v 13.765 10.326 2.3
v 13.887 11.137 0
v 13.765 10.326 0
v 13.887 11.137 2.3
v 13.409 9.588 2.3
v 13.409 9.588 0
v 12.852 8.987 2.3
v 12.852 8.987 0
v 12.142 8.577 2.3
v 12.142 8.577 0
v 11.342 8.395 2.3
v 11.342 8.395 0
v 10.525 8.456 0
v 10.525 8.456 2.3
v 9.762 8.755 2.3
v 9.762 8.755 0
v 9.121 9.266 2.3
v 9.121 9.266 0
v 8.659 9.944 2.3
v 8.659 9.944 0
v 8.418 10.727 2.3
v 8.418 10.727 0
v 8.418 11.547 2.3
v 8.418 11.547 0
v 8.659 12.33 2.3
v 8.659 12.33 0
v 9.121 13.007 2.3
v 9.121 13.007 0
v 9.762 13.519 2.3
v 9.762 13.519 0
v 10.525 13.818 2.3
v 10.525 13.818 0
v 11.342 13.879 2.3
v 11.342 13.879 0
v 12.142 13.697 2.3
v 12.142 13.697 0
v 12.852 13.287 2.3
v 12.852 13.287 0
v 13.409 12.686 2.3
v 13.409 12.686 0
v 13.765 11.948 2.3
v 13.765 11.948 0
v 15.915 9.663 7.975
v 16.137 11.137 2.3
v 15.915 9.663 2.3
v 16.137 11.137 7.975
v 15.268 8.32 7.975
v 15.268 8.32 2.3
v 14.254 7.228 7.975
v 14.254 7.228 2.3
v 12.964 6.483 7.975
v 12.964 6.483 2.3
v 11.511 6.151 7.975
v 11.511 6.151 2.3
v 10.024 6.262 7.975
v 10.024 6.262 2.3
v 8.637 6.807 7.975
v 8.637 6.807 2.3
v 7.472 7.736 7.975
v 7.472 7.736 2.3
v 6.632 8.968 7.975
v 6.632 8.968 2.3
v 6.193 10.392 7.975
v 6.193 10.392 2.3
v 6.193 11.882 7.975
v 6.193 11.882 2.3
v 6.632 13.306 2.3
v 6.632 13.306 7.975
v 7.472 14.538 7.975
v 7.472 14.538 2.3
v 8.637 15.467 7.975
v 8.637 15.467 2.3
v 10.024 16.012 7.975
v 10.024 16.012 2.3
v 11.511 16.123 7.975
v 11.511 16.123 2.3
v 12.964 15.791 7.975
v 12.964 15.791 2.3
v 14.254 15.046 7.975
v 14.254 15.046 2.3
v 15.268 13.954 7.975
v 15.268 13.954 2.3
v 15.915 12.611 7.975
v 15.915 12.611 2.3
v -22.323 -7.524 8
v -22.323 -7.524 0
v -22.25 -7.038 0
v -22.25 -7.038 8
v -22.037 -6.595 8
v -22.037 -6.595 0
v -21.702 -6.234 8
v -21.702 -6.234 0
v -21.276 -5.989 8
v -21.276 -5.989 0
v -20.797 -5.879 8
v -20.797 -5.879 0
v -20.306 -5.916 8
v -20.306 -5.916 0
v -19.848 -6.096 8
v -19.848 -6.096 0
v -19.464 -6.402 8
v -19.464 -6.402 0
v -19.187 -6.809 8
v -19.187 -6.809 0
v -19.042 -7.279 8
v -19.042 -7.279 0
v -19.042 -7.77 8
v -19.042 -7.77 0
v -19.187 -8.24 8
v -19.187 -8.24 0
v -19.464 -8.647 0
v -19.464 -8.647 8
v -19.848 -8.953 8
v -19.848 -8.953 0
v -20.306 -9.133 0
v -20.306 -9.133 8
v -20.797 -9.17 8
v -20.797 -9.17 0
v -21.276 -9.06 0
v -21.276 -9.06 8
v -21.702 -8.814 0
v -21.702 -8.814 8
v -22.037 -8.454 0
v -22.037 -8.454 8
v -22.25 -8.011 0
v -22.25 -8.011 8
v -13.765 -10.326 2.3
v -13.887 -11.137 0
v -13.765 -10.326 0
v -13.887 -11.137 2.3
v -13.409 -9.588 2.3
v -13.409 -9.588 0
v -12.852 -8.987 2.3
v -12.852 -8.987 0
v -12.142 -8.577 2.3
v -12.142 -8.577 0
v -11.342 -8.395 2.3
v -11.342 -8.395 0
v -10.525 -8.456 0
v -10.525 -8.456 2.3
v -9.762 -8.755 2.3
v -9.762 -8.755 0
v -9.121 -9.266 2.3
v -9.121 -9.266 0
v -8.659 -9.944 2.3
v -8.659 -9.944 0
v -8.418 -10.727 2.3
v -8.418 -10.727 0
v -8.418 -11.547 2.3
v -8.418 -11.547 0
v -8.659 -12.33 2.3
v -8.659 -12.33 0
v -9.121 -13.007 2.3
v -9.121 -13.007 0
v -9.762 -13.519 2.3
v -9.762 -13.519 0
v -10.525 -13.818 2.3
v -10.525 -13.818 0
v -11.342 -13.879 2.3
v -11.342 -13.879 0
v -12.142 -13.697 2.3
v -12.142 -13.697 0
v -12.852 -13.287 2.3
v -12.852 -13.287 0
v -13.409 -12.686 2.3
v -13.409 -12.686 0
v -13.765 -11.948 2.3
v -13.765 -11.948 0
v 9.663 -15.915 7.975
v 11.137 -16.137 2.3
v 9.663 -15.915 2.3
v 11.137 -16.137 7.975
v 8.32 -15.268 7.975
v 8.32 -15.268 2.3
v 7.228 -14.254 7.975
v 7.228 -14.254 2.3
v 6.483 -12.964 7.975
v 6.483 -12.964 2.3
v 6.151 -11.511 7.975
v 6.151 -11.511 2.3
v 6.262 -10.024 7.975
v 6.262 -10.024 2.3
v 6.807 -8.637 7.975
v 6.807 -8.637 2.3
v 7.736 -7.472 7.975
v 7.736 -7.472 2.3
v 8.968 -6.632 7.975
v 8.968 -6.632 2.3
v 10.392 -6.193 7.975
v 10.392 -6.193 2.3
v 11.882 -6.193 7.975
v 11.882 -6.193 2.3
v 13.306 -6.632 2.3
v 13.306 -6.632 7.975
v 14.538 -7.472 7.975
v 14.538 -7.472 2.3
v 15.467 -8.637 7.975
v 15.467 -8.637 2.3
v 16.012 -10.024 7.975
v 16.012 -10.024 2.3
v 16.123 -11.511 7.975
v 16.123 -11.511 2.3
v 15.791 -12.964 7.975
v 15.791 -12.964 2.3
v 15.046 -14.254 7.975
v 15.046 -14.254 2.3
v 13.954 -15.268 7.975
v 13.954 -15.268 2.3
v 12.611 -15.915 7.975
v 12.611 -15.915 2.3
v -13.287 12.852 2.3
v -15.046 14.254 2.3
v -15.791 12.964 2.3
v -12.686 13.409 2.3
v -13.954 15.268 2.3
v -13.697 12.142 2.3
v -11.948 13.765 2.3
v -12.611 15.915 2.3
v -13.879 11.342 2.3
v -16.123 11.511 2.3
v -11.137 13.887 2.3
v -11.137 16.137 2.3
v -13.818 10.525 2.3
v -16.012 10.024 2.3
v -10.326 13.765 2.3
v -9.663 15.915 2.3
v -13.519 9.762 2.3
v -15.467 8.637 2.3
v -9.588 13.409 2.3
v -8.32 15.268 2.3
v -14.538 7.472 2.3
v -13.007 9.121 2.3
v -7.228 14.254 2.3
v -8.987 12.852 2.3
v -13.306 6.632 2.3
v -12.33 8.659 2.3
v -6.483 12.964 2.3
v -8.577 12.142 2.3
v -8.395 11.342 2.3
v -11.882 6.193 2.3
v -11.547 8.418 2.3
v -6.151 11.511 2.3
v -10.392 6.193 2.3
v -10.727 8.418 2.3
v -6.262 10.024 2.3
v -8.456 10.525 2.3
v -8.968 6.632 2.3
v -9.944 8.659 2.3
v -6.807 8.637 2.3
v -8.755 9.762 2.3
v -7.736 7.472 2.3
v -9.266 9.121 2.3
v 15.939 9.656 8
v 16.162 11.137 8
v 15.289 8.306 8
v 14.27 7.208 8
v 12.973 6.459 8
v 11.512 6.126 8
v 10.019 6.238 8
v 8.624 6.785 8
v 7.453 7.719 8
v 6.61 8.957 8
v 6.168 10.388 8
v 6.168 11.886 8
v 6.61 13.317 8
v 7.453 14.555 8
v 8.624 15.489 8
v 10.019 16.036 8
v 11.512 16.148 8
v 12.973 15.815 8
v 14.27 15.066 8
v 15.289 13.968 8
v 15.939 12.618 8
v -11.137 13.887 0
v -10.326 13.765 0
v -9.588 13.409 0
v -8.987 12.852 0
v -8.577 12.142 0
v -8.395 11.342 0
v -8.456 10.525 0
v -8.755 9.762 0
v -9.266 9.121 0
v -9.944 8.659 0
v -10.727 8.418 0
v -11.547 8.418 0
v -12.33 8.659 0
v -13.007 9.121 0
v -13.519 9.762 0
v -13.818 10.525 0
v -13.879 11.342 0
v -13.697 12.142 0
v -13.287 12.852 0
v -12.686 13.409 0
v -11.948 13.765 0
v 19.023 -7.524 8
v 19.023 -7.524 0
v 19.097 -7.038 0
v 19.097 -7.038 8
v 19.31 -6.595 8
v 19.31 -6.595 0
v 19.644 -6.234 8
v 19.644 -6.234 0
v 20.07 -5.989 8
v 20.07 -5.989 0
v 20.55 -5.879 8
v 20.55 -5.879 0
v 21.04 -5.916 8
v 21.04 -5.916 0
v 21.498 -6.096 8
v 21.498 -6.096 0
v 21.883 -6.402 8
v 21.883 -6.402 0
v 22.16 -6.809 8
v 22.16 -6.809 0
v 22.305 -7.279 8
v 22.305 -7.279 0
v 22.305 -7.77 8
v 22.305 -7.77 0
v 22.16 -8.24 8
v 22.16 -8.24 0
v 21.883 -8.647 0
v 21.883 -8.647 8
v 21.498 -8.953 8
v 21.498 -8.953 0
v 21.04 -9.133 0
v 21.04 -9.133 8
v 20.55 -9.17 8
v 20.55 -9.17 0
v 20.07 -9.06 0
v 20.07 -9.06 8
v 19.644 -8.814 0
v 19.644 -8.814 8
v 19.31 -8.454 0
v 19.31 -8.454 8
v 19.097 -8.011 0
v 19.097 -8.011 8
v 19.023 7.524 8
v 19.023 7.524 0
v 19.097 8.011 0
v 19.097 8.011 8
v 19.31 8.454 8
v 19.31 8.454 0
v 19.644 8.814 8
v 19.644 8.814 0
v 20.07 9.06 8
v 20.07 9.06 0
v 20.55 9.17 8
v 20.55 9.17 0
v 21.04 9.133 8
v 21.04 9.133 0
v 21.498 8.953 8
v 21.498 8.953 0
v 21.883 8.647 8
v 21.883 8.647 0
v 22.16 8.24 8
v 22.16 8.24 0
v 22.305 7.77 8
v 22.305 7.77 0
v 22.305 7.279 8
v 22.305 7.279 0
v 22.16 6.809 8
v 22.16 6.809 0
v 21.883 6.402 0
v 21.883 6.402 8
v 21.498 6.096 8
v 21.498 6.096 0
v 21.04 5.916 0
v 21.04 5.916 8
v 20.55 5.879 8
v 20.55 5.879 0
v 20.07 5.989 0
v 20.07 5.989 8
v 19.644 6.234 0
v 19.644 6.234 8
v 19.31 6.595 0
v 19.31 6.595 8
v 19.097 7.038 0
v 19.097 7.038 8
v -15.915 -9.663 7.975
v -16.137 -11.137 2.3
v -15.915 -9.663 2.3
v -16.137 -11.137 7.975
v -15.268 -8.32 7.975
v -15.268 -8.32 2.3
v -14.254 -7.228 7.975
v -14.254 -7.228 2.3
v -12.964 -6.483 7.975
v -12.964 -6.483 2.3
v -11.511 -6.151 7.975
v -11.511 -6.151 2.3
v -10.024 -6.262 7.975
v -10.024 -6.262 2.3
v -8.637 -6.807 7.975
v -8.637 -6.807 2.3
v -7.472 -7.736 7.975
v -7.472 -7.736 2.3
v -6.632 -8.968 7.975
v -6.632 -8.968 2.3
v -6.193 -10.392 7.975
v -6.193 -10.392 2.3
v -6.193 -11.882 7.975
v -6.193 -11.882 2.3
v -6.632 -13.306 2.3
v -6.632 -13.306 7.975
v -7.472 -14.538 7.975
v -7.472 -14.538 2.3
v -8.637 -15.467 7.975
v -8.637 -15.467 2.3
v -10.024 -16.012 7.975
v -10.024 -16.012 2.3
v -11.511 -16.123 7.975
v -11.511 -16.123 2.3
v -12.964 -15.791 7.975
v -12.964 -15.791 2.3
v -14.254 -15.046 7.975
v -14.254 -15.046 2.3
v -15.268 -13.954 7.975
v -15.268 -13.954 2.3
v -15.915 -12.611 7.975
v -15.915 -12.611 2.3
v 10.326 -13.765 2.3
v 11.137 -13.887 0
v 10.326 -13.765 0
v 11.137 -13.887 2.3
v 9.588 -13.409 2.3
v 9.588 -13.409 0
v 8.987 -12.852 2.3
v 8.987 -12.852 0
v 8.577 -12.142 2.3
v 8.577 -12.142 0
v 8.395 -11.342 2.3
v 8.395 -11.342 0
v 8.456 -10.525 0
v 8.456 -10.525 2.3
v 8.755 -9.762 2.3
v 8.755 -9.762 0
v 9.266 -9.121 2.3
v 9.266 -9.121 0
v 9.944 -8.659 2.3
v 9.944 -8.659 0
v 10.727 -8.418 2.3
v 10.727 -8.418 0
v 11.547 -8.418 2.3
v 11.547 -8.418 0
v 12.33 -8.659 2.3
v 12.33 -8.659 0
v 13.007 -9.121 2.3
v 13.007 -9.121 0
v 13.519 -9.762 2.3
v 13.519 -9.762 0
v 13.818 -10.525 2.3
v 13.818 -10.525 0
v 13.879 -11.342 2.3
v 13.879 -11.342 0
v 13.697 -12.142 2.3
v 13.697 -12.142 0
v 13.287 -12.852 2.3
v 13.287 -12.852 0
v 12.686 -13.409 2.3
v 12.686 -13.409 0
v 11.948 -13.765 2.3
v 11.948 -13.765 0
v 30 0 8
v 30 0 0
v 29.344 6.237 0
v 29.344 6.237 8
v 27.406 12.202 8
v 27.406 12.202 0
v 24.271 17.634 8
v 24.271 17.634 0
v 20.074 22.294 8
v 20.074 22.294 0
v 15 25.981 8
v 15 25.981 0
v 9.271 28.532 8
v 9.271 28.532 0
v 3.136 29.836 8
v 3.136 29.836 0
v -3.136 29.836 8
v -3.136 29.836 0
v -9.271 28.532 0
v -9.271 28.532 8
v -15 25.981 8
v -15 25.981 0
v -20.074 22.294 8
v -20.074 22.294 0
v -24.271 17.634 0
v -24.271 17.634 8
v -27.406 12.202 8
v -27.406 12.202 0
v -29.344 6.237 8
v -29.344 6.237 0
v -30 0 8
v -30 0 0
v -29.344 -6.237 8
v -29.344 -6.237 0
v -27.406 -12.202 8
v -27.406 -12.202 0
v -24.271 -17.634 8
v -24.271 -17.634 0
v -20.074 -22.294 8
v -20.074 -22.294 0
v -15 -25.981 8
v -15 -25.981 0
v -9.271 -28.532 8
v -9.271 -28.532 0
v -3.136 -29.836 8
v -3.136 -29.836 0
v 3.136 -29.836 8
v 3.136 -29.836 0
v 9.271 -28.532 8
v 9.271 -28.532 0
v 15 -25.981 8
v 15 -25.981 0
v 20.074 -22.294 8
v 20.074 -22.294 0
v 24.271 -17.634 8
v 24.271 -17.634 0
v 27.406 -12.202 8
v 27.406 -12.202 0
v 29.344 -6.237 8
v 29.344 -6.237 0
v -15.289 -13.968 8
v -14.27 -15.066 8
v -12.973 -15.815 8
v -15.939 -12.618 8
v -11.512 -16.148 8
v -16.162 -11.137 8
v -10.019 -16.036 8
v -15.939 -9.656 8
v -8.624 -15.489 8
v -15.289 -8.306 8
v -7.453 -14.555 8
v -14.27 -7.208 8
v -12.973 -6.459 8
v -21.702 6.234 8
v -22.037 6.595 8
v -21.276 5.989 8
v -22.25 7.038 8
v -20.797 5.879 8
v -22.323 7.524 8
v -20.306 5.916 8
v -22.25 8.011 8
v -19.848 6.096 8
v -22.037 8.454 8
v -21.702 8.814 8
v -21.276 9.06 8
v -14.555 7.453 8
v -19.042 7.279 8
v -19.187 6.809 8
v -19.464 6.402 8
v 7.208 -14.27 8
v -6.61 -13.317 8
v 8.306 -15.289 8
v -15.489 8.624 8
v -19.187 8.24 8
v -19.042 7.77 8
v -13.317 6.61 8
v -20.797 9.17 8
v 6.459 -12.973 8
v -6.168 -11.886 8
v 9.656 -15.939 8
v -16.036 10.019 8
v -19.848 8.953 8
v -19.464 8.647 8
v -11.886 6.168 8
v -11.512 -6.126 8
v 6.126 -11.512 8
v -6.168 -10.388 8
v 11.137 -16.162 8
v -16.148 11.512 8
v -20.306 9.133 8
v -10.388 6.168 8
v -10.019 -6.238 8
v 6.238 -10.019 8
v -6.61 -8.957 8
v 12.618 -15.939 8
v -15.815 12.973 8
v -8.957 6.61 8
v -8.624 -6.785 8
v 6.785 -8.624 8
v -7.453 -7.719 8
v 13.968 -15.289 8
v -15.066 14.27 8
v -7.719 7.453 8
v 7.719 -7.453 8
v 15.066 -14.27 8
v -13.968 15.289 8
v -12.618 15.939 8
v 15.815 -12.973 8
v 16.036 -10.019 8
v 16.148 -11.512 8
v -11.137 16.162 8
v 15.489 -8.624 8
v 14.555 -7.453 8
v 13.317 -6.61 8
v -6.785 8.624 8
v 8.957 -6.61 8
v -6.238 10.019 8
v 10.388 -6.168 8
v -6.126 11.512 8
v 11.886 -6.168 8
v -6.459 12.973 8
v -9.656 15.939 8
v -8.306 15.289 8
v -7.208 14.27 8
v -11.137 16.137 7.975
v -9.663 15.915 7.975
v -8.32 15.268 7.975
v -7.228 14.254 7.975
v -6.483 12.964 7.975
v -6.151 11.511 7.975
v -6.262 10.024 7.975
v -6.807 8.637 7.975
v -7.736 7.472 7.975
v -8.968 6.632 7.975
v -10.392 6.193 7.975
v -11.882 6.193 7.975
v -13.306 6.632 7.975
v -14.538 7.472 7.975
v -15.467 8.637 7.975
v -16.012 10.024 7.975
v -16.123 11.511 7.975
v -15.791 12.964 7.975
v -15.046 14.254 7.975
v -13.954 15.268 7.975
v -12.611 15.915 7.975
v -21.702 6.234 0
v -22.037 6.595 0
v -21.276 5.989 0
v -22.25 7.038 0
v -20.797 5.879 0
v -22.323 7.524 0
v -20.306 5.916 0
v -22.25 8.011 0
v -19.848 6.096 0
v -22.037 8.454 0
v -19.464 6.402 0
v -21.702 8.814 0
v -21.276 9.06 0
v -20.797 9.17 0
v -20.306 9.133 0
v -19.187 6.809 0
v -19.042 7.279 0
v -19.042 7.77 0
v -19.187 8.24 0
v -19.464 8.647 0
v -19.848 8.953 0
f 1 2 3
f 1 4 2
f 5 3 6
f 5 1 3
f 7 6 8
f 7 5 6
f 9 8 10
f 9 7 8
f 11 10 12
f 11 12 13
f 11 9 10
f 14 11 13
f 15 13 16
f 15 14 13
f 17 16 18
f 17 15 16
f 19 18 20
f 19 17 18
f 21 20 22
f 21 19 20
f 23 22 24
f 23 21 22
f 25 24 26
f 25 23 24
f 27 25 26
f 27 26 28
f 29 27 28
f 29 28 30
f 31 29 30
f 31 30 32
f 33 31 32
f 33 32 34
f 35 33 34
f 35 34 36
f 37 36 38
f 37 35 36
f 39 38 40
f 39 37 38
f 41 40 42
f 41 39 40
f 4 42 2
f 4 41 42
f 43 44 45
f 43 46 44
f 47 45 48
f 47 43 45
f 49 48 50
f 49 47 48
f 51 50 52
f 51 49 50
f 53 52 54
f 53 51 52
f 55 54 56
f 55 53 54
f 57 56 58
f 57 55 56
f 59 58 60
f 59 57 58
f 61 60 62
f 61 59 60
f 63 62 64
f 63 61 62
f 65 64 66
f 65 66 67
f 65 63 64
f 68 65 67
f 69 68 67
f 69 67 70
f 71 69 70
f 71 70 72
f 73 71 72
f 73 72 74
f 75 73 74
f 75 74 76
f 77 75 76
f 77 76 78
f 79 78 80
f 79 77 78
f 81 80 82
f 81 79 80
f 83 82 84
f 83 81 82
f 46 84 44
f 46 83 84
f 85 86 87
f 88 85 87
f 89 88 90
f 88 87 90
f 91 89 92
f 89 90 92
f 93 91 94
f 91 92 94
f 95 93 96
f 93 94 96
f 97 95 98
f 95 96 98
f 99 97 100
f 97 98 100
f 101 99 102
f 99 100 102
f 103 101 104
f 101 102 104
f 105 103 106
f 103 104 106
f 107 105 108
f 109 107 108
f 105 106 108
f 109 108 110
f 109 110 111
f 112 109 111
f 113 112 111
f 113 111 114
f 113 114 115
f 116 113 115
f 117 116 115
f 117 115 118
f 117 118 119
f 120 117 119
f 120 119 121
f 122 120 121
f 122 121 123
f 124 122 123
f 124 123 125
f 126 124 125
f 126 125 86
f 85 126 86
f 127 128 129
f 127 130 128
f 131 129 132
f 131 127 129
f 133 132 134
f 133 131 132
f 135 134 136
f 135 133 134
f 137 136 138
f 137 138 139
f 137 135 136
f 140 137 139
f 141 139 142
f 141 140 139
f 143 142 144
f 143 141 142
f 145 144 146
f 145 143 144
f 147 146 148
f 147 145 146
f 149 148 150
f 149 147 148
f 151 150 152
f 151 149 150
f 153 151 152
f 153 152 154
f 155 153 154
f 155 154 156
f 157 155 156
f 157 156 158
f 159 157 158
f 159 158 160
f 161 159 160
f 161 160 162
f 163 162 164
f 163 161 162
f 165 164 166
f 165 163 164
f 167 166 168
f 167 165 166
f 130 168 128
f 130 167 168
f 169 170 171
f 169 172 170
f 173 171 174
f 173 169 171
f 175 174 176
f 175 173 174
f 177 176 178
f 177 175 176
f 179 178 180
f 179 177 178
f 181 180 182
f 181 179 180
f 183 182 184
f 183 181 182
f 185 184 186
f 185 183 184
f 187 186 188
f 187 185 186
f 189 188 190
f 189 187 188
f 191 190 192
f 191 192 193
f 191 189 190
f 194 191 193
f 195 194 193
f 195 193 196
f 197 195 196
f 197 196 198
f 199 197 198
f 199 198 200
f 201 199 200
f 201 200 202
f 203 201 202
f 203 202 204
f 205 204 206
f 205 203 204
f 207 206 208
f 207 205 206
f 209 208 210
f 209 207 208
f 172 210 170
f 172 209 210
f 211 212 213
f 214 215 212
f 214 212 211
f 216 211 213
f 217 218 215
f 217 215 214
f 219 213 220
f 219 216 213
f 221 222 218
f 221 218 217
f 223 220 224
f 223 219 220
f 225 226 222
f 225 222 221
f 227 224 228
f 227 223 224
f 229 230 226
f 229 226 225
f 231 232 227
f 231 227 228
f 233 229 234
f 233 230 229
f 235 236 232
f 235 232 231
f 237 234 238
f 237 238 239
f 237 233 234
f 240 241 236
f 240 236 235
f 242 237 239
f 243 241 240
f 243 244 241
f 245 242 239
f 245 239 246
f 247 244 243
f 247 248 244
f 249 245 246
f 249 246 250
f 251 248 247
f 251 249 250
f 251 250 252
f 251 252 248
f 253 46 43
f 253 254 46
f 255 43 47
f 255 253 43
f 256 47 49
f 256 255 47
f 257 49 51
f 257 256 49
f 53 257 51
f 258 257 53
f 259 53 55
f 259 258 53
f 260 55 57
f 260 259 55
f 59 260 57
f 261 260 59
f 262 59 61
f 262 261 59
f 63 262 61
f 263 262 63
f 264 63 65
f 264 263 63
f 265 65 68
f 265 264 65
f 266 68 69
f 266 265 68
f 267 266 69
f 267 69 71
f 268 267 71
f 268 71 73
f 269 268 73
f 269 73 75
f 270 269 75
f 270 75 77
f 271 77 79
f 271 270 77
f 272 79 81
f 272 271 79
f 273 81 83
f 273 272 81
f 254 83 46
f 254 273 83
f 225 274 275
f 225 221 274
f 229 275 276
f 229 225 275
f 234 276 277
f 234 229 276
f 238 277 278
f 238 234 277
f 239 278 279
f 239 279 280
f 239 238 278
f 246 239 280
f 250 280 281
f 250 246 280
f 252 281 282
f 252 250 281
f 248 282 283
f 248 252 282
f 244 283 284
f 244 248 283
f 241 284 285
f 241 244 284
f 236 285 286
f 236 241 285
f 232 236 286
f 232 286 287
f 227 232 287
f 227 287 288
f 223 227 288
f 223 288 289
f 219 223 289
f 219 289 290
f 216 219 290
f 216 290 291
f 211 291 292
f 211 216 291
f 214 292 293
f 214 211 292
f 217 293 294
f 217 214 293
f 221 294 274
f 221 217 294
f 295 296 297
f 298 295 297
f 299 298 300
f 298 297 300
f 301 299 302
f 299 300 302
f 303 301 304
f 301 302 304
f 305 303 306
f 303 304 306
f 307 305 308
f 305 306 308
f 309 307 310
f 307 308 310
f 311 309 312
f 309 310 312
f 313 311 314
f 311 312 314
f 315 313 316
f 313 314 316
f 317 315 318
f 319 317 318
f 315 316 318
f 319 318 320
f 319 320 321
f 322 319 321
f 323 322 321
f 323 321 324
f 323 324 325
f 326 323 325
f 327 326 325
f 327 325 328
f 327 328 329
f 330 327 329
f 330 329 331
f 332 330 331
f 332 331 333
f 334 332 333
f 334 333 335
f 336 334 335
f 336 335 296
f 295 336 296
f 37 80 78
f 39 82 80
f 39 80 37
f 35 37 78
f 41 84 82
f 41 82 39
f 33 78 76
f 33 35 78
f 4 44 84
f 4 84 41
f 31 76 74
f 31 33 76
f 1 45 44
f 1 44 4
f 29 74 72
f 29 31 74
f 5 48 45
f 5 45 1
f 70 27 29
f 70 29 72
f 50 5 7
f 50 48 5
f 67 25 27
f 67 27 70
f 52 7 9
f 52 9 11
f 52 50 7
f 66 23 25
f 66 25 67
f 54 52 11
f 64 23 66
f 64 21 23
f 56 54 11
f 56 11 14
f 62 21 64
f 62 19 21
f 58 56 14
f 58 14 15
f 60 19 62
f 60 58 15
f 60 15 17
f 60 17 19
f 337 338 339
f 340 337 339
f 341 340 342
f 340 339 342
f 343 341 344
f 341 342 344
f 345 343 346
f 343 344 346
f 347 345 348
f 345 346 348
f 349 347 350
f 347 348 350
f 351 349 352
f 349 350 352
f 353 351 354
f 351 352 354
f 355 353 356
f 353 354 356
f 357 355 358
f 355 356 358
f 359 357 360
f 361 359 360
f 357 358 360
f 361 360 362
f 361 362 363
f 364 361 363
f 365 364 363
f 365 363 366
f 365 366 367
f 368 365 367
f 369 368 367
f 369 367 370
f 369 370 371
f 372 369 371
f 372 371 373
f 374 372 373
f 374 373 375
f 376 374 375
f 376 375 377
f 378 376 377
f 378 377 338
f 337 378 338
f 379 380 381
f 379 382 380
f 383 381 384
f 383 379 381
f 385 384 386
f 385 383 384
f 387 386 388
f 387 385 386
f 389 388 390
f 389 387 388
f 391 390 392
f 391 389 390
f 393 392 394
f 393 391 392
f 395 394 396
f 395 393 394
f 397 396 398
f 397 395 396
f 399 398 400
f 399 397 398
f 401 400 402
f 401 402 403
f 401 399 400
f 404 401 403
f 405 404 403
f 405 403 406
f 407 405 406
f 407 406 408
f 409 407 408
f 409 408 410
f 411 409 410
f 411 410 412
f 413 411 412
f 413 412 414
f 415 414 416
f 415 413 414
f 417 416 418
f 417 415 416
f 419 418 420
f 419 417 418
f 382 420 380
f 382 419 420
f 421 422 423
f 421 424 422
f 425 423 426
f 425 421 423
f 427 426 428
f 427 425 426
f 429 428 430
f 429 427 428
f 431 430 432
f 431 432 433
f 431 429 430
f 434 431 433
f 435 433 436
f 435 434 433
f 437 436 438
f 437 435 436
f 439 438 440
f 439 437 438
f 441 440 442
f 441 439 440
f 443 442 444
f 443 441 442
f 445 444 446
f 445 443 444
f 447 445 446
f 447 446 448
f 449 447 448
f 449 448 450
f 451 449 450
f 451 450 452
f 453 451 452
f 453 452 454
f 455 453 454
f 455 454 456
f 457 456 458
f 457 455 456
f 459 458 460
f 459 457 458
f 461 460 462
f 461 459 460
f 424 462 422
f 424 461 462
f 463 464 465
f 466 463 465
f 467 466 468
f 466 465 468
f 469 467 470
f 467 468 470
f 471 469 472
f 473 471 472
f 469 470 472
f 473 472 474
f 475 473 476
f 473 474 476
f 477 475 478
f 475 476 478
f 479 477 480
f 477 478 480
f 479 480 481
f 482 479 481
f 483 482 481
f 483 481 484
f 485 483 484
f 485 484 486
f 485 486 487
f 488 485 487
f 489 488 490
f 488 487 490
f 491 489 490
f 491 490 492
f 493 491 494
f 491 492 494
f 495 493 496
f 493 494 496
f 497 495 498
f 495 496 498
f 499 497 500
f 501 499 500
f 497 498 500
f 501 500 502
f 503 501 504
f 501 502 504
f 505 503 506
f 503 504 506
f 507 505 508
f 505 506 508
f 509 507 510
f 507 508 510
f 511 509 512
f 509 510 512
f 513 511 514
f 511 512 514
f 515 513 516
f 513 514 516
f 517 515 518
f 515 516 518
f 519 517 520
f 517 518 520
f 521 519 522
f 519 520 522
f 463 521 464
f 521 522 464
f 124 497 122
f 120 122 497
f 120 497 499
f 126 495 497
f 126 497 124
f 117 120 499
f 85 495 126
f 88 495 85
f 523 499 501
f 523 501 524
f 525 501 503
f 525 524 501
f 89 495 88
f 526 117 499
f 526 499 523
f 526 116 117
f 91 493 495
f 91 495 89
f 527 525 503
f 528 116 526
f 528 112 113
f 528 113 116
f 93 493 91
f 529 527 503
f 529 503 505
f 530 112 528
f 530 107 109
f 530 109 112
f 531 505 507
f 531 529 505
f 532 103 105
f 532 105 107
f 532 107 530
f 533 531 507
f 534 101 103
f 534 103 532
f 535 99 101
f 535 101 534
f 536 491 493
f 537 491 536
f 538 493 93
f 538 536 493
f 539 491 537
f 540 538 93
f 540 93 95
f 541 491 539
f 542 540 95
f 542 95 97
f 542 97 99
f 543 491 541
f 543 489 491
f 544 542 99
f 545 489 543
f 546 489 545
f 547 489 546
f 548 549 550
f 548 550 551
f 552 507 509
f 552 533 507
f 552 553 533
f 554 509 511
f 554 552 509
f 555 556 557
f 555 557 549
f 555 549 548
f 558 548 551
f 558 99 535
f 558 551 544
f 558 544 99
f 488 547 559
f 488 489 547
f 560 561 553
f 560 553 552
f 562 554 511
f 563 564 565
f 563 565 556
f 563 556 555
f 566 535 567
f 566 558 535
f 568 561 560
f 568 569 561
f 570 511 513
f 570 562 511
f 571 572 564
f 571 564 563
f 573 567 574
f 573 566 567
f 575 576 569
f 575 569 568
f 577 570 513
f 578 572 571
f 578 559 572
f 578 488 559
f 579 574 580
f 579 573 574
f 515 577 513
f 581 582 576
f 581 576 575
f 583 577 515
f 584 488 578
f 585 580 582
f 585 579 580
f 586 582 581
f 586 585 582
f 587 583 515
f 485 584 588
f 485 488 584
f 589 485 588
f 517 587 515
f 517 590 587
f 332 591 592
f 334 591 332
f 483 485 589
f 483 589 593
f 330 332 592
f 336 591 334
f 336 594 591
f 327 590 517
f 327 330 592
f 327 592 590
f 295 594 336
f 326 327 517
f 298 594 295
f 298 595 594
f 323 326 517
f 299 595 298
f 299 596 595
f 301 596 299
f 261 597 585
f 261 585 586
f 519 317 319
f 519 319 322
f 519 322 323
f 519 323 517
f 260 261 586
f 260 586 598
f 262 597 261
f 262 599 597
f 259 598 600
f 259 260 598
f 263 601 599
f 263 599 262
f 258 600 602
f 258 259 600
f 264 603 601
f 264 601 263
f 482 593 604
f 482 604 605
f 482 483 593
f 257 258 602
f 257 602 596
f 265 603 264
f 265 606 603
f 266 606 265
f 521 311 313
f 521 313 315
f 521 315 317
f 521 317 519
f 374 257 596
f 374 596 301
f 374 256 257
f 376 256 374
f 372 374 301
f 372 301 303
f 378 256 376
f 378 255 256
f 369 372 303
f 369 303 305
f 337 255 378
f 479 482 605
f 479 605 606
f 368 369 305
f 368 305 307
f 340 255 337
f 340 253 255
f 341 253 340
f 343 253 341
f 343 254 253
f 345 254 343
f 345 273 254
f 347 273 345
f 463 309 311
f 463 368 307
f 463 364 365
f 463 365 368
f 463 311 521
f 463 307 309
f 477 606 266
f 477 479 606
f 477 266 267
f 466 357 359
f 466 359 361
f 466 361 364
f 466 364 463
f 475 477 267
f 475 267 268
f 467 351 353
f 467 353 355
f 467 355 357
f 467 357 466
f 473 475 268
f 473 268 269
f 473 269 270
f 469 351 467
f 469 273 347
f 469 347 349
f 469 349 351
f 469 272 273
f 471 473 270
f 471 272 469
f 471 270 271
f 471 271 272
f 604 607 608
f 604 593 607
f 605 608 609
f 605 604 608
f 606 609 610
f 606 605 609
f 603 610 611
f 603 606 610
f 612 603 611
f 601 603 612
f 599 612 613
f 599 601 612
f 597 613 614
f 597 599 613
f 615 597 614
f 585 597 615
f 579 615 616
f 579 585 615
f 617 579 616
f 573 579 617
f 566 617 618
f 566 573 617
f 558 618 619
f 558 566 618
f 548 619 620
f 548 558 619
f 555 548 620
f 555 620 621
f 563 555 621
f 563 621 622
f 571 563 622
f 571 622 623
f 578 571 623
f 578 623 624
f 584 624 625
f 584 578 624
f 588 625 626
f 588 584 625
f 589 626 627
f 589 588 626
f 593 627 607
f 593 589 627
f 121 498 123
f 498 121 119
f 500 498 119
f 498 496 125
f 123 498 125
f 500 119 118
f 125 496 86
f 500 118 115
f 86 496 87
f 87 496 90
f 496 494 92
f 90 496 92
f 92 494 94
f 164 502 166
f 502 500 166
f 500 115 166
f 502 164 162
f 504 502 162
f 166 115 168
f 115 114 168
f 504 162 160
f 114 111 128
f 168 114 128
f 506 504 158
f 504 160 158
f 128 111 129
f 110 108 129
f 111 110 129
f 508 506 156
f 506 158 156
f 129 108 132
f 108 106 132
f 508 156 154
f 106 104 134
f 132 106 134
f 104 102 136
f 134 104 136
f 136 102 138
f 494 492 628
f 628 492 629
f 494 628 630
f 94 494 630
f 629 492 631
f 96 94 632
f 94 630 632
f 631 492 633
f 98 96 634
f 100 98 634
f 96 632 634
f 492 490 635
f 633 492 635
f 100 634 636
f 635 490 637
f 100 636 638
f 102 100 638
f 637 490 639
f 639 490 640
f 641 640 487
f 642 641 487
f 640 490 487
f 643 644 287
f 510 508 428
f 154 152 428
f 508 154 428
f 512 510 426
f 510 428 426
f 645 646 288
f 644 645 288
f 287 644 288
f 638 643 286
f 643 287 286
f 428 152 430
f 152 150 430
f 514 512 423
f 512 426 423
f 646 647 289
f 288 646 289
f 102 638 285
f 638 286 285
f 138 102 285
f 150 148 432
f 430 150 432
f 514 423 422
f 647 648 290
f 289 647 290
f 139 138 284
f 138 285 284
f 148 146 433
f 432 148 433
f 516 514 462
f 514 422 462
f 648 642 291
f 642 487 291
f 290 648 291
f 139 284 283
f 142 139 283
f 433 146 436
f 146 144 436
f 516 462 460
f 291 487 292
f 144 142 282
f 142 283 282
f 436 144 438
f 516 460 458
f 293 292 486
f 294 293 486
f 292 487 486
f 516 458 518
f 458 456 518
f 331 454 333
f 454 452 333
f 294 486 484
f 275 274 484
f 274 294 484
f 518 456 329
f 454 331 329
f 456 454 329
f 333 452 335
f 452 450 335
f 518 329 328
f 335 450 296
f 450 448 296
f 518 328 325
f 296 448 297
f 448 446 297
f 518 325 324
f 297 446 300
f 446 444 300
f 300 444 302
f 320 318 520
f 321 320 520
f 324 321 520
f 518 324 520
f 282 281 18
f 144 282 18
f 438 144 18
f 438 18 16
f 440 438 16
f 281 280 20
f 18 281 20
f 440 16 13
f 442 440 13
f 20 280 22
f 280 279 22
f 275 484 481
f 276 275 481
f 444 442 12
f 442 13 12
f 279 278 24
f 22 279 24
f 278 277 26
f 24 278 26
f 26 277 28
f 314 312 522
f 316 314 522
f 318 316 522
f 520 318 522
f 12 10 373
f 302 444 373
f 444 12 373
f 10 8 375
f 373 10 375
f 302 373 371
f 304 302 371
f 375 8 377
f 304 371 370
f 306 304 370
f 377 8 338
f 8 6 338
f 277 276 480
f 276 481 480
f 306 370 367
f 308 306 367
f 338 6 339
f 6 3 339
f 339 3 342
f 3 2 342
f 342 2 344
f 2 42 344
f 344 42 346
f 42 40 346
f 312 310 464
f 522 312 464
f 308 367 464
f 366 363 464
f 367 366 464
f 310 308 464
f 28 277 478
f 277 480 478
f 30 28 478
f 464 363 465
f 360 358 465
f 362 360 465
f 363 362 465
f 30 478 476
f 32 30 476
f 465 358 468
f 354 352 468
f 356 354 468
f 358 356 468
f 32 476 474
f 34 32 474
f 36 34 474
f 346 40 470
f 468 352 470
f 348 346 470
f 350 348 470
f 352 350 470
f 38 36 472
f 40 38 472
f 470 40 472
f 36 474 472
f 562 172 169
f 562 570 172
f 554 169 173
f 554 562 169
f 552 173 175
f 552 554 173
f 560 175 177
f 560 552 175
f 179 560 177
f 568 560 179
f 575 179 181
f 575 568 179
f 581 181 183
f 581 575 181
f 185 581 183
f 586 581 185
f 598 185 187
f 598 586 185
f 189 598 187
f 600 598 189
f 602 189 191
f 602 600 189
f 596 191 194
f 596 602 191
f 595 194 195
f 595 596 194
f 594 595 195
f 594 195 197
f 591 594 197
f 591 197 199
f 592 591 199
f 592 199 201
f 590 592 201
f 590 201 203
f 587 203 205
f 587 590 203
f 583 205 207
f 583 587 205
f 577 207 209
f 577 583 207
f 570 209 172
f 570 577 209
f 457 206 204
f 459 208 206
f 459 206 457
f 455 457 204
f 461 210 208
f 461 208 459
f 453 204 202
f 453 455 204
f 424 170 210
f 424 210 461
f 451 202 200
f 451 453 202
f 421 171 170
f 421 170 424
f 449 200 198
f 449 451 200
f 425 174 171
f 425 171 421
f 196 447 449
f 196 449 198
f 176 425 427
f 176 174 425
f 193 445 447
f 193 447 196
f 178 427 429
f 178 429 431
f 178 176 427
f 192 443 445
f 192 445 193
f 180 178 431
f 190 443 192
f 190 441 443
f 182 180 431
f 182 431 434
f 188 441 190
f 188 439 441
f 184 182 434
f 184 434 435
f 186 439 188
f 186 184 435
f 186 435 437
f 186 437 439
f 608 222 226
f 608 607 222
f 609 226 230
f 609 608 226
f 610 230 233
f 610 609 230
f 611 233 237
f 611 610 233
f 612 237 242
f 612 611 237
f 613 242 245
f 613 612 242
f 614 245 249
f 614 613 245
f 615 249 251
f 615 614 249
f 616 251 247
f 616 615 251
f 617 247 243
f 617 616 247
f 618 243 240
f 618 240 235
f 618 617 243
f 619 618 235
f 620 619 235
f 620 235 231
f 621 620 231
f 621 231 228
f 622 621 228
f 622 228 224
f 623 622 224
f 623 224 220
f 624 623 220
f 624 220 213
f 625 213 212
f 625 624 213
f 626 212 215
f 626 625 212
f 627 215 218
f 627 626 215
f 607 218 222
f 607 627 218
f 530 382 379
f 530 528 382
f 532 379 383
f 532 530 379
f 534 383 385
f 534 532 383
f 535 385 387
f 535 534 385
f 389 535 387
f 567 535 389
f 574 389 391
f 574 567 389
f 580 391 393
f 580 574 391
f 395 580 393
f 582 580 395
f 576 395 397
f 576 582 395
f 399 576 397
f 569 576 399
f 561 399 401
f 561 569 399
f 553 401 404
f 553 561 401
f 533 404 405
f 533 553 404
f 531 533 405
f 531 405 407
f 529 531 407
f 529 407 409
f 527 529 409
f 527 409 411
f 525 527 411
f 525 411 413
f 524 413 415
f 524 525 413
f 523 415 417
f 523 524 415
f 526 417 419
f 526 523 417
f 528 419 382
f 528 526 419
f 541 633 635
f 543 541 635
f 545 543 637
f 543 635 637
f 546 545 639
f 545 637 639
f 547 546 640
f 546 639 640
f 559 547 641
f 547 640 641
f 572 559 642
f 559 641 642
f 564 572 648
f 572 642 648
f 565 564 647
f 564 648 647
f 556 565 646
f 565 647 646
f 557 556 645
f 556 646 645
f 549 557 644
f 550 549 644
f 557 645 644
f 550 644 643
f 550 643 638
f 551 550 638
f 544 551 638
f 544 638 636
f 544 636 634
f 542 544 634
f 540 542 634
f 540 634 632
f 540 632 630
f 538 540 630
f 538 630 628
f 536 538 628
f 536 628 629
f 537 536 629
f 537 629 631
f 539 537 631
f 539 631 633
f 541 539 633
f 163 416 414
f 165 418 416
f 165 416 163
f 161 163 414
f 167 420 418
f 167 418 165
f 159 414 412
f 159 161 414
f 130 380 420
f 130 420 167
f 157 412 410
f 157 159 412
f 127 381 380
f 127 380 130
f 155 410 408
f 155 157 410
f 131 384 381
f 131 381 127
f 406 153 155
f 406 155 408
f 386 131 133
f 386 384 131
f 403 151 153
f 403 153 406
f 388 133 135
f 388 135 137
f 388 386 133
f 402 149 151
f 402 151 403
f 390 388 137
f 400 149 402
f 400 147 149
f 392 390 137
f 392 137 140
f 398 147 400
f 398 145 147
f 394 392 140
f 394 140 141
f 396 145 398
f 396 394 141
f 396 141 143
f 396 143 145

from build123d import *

# Parameters (mm, degrees)
SKETCH_1_R               = 30
EXTRUDE_1_DEPTH          = 8
PATTERN_CIRCULAR_1_COUNT = 4
HOLE_WIZARD_M4_1_D       = 3.3


with BuildPart() as part:
    # 草图1 → 凸台-拉伸1 (new body)
    with BuildSketch(Plane.XY):
        Circle(SKETCH_1_R)
    extrude(amount=EXTRUDE_1_DEPTH)

    # 草图7 → 打孔尺寸(%根据)内六角圆柱头螺钉的类型1 (revolve, cut)
    with BuildSketch(Plane(origin=(11.136931804, -11.136931804, 8), x_dir=(0, -1, 0), z_dir=(1, 0, 0))):
        Polygon((0, 0), (0, 8), (2.75, 8), (2.75, 5.7), (5, 5.7), (5, 0.025), (5.025, 0), align=None)
    hole_wizard_1 = revolve(axis=Axis((11.136931804, -11.136931804, 14.35), (0, 0, -1)), mode=Mode.SUBTRACT)

    # 阵列(圆周)1: 打孔尺寸(%根据)内六角圆柱头螺钉的类型1 ×4 about axis
    pattern_circular_1_axis = Axis((0, 0, 0), (0, 0, 1))
    for i in range(1, PATTERN_CIRCULAR_1_COUNT):
        add(hole_wizard_1.rotate(pattern_circular_1_axis, i * 360 / PATTERN_CIRCULAR_1_COUNT), mode=Mode.SUBTRACT)

    # M4 螺纹孔1 (through all)
    with Locations(Plane.XY.offset(8)):
        with Locations((20.673237657, 7.524443153), (20.673237657, -7.524443153), (-20.673237657, 7.524443153), (-20.673237657, -7.524443153)):
            Hole(HOLE_WIZARD_M4_1_D / 2)


solid = part.part
